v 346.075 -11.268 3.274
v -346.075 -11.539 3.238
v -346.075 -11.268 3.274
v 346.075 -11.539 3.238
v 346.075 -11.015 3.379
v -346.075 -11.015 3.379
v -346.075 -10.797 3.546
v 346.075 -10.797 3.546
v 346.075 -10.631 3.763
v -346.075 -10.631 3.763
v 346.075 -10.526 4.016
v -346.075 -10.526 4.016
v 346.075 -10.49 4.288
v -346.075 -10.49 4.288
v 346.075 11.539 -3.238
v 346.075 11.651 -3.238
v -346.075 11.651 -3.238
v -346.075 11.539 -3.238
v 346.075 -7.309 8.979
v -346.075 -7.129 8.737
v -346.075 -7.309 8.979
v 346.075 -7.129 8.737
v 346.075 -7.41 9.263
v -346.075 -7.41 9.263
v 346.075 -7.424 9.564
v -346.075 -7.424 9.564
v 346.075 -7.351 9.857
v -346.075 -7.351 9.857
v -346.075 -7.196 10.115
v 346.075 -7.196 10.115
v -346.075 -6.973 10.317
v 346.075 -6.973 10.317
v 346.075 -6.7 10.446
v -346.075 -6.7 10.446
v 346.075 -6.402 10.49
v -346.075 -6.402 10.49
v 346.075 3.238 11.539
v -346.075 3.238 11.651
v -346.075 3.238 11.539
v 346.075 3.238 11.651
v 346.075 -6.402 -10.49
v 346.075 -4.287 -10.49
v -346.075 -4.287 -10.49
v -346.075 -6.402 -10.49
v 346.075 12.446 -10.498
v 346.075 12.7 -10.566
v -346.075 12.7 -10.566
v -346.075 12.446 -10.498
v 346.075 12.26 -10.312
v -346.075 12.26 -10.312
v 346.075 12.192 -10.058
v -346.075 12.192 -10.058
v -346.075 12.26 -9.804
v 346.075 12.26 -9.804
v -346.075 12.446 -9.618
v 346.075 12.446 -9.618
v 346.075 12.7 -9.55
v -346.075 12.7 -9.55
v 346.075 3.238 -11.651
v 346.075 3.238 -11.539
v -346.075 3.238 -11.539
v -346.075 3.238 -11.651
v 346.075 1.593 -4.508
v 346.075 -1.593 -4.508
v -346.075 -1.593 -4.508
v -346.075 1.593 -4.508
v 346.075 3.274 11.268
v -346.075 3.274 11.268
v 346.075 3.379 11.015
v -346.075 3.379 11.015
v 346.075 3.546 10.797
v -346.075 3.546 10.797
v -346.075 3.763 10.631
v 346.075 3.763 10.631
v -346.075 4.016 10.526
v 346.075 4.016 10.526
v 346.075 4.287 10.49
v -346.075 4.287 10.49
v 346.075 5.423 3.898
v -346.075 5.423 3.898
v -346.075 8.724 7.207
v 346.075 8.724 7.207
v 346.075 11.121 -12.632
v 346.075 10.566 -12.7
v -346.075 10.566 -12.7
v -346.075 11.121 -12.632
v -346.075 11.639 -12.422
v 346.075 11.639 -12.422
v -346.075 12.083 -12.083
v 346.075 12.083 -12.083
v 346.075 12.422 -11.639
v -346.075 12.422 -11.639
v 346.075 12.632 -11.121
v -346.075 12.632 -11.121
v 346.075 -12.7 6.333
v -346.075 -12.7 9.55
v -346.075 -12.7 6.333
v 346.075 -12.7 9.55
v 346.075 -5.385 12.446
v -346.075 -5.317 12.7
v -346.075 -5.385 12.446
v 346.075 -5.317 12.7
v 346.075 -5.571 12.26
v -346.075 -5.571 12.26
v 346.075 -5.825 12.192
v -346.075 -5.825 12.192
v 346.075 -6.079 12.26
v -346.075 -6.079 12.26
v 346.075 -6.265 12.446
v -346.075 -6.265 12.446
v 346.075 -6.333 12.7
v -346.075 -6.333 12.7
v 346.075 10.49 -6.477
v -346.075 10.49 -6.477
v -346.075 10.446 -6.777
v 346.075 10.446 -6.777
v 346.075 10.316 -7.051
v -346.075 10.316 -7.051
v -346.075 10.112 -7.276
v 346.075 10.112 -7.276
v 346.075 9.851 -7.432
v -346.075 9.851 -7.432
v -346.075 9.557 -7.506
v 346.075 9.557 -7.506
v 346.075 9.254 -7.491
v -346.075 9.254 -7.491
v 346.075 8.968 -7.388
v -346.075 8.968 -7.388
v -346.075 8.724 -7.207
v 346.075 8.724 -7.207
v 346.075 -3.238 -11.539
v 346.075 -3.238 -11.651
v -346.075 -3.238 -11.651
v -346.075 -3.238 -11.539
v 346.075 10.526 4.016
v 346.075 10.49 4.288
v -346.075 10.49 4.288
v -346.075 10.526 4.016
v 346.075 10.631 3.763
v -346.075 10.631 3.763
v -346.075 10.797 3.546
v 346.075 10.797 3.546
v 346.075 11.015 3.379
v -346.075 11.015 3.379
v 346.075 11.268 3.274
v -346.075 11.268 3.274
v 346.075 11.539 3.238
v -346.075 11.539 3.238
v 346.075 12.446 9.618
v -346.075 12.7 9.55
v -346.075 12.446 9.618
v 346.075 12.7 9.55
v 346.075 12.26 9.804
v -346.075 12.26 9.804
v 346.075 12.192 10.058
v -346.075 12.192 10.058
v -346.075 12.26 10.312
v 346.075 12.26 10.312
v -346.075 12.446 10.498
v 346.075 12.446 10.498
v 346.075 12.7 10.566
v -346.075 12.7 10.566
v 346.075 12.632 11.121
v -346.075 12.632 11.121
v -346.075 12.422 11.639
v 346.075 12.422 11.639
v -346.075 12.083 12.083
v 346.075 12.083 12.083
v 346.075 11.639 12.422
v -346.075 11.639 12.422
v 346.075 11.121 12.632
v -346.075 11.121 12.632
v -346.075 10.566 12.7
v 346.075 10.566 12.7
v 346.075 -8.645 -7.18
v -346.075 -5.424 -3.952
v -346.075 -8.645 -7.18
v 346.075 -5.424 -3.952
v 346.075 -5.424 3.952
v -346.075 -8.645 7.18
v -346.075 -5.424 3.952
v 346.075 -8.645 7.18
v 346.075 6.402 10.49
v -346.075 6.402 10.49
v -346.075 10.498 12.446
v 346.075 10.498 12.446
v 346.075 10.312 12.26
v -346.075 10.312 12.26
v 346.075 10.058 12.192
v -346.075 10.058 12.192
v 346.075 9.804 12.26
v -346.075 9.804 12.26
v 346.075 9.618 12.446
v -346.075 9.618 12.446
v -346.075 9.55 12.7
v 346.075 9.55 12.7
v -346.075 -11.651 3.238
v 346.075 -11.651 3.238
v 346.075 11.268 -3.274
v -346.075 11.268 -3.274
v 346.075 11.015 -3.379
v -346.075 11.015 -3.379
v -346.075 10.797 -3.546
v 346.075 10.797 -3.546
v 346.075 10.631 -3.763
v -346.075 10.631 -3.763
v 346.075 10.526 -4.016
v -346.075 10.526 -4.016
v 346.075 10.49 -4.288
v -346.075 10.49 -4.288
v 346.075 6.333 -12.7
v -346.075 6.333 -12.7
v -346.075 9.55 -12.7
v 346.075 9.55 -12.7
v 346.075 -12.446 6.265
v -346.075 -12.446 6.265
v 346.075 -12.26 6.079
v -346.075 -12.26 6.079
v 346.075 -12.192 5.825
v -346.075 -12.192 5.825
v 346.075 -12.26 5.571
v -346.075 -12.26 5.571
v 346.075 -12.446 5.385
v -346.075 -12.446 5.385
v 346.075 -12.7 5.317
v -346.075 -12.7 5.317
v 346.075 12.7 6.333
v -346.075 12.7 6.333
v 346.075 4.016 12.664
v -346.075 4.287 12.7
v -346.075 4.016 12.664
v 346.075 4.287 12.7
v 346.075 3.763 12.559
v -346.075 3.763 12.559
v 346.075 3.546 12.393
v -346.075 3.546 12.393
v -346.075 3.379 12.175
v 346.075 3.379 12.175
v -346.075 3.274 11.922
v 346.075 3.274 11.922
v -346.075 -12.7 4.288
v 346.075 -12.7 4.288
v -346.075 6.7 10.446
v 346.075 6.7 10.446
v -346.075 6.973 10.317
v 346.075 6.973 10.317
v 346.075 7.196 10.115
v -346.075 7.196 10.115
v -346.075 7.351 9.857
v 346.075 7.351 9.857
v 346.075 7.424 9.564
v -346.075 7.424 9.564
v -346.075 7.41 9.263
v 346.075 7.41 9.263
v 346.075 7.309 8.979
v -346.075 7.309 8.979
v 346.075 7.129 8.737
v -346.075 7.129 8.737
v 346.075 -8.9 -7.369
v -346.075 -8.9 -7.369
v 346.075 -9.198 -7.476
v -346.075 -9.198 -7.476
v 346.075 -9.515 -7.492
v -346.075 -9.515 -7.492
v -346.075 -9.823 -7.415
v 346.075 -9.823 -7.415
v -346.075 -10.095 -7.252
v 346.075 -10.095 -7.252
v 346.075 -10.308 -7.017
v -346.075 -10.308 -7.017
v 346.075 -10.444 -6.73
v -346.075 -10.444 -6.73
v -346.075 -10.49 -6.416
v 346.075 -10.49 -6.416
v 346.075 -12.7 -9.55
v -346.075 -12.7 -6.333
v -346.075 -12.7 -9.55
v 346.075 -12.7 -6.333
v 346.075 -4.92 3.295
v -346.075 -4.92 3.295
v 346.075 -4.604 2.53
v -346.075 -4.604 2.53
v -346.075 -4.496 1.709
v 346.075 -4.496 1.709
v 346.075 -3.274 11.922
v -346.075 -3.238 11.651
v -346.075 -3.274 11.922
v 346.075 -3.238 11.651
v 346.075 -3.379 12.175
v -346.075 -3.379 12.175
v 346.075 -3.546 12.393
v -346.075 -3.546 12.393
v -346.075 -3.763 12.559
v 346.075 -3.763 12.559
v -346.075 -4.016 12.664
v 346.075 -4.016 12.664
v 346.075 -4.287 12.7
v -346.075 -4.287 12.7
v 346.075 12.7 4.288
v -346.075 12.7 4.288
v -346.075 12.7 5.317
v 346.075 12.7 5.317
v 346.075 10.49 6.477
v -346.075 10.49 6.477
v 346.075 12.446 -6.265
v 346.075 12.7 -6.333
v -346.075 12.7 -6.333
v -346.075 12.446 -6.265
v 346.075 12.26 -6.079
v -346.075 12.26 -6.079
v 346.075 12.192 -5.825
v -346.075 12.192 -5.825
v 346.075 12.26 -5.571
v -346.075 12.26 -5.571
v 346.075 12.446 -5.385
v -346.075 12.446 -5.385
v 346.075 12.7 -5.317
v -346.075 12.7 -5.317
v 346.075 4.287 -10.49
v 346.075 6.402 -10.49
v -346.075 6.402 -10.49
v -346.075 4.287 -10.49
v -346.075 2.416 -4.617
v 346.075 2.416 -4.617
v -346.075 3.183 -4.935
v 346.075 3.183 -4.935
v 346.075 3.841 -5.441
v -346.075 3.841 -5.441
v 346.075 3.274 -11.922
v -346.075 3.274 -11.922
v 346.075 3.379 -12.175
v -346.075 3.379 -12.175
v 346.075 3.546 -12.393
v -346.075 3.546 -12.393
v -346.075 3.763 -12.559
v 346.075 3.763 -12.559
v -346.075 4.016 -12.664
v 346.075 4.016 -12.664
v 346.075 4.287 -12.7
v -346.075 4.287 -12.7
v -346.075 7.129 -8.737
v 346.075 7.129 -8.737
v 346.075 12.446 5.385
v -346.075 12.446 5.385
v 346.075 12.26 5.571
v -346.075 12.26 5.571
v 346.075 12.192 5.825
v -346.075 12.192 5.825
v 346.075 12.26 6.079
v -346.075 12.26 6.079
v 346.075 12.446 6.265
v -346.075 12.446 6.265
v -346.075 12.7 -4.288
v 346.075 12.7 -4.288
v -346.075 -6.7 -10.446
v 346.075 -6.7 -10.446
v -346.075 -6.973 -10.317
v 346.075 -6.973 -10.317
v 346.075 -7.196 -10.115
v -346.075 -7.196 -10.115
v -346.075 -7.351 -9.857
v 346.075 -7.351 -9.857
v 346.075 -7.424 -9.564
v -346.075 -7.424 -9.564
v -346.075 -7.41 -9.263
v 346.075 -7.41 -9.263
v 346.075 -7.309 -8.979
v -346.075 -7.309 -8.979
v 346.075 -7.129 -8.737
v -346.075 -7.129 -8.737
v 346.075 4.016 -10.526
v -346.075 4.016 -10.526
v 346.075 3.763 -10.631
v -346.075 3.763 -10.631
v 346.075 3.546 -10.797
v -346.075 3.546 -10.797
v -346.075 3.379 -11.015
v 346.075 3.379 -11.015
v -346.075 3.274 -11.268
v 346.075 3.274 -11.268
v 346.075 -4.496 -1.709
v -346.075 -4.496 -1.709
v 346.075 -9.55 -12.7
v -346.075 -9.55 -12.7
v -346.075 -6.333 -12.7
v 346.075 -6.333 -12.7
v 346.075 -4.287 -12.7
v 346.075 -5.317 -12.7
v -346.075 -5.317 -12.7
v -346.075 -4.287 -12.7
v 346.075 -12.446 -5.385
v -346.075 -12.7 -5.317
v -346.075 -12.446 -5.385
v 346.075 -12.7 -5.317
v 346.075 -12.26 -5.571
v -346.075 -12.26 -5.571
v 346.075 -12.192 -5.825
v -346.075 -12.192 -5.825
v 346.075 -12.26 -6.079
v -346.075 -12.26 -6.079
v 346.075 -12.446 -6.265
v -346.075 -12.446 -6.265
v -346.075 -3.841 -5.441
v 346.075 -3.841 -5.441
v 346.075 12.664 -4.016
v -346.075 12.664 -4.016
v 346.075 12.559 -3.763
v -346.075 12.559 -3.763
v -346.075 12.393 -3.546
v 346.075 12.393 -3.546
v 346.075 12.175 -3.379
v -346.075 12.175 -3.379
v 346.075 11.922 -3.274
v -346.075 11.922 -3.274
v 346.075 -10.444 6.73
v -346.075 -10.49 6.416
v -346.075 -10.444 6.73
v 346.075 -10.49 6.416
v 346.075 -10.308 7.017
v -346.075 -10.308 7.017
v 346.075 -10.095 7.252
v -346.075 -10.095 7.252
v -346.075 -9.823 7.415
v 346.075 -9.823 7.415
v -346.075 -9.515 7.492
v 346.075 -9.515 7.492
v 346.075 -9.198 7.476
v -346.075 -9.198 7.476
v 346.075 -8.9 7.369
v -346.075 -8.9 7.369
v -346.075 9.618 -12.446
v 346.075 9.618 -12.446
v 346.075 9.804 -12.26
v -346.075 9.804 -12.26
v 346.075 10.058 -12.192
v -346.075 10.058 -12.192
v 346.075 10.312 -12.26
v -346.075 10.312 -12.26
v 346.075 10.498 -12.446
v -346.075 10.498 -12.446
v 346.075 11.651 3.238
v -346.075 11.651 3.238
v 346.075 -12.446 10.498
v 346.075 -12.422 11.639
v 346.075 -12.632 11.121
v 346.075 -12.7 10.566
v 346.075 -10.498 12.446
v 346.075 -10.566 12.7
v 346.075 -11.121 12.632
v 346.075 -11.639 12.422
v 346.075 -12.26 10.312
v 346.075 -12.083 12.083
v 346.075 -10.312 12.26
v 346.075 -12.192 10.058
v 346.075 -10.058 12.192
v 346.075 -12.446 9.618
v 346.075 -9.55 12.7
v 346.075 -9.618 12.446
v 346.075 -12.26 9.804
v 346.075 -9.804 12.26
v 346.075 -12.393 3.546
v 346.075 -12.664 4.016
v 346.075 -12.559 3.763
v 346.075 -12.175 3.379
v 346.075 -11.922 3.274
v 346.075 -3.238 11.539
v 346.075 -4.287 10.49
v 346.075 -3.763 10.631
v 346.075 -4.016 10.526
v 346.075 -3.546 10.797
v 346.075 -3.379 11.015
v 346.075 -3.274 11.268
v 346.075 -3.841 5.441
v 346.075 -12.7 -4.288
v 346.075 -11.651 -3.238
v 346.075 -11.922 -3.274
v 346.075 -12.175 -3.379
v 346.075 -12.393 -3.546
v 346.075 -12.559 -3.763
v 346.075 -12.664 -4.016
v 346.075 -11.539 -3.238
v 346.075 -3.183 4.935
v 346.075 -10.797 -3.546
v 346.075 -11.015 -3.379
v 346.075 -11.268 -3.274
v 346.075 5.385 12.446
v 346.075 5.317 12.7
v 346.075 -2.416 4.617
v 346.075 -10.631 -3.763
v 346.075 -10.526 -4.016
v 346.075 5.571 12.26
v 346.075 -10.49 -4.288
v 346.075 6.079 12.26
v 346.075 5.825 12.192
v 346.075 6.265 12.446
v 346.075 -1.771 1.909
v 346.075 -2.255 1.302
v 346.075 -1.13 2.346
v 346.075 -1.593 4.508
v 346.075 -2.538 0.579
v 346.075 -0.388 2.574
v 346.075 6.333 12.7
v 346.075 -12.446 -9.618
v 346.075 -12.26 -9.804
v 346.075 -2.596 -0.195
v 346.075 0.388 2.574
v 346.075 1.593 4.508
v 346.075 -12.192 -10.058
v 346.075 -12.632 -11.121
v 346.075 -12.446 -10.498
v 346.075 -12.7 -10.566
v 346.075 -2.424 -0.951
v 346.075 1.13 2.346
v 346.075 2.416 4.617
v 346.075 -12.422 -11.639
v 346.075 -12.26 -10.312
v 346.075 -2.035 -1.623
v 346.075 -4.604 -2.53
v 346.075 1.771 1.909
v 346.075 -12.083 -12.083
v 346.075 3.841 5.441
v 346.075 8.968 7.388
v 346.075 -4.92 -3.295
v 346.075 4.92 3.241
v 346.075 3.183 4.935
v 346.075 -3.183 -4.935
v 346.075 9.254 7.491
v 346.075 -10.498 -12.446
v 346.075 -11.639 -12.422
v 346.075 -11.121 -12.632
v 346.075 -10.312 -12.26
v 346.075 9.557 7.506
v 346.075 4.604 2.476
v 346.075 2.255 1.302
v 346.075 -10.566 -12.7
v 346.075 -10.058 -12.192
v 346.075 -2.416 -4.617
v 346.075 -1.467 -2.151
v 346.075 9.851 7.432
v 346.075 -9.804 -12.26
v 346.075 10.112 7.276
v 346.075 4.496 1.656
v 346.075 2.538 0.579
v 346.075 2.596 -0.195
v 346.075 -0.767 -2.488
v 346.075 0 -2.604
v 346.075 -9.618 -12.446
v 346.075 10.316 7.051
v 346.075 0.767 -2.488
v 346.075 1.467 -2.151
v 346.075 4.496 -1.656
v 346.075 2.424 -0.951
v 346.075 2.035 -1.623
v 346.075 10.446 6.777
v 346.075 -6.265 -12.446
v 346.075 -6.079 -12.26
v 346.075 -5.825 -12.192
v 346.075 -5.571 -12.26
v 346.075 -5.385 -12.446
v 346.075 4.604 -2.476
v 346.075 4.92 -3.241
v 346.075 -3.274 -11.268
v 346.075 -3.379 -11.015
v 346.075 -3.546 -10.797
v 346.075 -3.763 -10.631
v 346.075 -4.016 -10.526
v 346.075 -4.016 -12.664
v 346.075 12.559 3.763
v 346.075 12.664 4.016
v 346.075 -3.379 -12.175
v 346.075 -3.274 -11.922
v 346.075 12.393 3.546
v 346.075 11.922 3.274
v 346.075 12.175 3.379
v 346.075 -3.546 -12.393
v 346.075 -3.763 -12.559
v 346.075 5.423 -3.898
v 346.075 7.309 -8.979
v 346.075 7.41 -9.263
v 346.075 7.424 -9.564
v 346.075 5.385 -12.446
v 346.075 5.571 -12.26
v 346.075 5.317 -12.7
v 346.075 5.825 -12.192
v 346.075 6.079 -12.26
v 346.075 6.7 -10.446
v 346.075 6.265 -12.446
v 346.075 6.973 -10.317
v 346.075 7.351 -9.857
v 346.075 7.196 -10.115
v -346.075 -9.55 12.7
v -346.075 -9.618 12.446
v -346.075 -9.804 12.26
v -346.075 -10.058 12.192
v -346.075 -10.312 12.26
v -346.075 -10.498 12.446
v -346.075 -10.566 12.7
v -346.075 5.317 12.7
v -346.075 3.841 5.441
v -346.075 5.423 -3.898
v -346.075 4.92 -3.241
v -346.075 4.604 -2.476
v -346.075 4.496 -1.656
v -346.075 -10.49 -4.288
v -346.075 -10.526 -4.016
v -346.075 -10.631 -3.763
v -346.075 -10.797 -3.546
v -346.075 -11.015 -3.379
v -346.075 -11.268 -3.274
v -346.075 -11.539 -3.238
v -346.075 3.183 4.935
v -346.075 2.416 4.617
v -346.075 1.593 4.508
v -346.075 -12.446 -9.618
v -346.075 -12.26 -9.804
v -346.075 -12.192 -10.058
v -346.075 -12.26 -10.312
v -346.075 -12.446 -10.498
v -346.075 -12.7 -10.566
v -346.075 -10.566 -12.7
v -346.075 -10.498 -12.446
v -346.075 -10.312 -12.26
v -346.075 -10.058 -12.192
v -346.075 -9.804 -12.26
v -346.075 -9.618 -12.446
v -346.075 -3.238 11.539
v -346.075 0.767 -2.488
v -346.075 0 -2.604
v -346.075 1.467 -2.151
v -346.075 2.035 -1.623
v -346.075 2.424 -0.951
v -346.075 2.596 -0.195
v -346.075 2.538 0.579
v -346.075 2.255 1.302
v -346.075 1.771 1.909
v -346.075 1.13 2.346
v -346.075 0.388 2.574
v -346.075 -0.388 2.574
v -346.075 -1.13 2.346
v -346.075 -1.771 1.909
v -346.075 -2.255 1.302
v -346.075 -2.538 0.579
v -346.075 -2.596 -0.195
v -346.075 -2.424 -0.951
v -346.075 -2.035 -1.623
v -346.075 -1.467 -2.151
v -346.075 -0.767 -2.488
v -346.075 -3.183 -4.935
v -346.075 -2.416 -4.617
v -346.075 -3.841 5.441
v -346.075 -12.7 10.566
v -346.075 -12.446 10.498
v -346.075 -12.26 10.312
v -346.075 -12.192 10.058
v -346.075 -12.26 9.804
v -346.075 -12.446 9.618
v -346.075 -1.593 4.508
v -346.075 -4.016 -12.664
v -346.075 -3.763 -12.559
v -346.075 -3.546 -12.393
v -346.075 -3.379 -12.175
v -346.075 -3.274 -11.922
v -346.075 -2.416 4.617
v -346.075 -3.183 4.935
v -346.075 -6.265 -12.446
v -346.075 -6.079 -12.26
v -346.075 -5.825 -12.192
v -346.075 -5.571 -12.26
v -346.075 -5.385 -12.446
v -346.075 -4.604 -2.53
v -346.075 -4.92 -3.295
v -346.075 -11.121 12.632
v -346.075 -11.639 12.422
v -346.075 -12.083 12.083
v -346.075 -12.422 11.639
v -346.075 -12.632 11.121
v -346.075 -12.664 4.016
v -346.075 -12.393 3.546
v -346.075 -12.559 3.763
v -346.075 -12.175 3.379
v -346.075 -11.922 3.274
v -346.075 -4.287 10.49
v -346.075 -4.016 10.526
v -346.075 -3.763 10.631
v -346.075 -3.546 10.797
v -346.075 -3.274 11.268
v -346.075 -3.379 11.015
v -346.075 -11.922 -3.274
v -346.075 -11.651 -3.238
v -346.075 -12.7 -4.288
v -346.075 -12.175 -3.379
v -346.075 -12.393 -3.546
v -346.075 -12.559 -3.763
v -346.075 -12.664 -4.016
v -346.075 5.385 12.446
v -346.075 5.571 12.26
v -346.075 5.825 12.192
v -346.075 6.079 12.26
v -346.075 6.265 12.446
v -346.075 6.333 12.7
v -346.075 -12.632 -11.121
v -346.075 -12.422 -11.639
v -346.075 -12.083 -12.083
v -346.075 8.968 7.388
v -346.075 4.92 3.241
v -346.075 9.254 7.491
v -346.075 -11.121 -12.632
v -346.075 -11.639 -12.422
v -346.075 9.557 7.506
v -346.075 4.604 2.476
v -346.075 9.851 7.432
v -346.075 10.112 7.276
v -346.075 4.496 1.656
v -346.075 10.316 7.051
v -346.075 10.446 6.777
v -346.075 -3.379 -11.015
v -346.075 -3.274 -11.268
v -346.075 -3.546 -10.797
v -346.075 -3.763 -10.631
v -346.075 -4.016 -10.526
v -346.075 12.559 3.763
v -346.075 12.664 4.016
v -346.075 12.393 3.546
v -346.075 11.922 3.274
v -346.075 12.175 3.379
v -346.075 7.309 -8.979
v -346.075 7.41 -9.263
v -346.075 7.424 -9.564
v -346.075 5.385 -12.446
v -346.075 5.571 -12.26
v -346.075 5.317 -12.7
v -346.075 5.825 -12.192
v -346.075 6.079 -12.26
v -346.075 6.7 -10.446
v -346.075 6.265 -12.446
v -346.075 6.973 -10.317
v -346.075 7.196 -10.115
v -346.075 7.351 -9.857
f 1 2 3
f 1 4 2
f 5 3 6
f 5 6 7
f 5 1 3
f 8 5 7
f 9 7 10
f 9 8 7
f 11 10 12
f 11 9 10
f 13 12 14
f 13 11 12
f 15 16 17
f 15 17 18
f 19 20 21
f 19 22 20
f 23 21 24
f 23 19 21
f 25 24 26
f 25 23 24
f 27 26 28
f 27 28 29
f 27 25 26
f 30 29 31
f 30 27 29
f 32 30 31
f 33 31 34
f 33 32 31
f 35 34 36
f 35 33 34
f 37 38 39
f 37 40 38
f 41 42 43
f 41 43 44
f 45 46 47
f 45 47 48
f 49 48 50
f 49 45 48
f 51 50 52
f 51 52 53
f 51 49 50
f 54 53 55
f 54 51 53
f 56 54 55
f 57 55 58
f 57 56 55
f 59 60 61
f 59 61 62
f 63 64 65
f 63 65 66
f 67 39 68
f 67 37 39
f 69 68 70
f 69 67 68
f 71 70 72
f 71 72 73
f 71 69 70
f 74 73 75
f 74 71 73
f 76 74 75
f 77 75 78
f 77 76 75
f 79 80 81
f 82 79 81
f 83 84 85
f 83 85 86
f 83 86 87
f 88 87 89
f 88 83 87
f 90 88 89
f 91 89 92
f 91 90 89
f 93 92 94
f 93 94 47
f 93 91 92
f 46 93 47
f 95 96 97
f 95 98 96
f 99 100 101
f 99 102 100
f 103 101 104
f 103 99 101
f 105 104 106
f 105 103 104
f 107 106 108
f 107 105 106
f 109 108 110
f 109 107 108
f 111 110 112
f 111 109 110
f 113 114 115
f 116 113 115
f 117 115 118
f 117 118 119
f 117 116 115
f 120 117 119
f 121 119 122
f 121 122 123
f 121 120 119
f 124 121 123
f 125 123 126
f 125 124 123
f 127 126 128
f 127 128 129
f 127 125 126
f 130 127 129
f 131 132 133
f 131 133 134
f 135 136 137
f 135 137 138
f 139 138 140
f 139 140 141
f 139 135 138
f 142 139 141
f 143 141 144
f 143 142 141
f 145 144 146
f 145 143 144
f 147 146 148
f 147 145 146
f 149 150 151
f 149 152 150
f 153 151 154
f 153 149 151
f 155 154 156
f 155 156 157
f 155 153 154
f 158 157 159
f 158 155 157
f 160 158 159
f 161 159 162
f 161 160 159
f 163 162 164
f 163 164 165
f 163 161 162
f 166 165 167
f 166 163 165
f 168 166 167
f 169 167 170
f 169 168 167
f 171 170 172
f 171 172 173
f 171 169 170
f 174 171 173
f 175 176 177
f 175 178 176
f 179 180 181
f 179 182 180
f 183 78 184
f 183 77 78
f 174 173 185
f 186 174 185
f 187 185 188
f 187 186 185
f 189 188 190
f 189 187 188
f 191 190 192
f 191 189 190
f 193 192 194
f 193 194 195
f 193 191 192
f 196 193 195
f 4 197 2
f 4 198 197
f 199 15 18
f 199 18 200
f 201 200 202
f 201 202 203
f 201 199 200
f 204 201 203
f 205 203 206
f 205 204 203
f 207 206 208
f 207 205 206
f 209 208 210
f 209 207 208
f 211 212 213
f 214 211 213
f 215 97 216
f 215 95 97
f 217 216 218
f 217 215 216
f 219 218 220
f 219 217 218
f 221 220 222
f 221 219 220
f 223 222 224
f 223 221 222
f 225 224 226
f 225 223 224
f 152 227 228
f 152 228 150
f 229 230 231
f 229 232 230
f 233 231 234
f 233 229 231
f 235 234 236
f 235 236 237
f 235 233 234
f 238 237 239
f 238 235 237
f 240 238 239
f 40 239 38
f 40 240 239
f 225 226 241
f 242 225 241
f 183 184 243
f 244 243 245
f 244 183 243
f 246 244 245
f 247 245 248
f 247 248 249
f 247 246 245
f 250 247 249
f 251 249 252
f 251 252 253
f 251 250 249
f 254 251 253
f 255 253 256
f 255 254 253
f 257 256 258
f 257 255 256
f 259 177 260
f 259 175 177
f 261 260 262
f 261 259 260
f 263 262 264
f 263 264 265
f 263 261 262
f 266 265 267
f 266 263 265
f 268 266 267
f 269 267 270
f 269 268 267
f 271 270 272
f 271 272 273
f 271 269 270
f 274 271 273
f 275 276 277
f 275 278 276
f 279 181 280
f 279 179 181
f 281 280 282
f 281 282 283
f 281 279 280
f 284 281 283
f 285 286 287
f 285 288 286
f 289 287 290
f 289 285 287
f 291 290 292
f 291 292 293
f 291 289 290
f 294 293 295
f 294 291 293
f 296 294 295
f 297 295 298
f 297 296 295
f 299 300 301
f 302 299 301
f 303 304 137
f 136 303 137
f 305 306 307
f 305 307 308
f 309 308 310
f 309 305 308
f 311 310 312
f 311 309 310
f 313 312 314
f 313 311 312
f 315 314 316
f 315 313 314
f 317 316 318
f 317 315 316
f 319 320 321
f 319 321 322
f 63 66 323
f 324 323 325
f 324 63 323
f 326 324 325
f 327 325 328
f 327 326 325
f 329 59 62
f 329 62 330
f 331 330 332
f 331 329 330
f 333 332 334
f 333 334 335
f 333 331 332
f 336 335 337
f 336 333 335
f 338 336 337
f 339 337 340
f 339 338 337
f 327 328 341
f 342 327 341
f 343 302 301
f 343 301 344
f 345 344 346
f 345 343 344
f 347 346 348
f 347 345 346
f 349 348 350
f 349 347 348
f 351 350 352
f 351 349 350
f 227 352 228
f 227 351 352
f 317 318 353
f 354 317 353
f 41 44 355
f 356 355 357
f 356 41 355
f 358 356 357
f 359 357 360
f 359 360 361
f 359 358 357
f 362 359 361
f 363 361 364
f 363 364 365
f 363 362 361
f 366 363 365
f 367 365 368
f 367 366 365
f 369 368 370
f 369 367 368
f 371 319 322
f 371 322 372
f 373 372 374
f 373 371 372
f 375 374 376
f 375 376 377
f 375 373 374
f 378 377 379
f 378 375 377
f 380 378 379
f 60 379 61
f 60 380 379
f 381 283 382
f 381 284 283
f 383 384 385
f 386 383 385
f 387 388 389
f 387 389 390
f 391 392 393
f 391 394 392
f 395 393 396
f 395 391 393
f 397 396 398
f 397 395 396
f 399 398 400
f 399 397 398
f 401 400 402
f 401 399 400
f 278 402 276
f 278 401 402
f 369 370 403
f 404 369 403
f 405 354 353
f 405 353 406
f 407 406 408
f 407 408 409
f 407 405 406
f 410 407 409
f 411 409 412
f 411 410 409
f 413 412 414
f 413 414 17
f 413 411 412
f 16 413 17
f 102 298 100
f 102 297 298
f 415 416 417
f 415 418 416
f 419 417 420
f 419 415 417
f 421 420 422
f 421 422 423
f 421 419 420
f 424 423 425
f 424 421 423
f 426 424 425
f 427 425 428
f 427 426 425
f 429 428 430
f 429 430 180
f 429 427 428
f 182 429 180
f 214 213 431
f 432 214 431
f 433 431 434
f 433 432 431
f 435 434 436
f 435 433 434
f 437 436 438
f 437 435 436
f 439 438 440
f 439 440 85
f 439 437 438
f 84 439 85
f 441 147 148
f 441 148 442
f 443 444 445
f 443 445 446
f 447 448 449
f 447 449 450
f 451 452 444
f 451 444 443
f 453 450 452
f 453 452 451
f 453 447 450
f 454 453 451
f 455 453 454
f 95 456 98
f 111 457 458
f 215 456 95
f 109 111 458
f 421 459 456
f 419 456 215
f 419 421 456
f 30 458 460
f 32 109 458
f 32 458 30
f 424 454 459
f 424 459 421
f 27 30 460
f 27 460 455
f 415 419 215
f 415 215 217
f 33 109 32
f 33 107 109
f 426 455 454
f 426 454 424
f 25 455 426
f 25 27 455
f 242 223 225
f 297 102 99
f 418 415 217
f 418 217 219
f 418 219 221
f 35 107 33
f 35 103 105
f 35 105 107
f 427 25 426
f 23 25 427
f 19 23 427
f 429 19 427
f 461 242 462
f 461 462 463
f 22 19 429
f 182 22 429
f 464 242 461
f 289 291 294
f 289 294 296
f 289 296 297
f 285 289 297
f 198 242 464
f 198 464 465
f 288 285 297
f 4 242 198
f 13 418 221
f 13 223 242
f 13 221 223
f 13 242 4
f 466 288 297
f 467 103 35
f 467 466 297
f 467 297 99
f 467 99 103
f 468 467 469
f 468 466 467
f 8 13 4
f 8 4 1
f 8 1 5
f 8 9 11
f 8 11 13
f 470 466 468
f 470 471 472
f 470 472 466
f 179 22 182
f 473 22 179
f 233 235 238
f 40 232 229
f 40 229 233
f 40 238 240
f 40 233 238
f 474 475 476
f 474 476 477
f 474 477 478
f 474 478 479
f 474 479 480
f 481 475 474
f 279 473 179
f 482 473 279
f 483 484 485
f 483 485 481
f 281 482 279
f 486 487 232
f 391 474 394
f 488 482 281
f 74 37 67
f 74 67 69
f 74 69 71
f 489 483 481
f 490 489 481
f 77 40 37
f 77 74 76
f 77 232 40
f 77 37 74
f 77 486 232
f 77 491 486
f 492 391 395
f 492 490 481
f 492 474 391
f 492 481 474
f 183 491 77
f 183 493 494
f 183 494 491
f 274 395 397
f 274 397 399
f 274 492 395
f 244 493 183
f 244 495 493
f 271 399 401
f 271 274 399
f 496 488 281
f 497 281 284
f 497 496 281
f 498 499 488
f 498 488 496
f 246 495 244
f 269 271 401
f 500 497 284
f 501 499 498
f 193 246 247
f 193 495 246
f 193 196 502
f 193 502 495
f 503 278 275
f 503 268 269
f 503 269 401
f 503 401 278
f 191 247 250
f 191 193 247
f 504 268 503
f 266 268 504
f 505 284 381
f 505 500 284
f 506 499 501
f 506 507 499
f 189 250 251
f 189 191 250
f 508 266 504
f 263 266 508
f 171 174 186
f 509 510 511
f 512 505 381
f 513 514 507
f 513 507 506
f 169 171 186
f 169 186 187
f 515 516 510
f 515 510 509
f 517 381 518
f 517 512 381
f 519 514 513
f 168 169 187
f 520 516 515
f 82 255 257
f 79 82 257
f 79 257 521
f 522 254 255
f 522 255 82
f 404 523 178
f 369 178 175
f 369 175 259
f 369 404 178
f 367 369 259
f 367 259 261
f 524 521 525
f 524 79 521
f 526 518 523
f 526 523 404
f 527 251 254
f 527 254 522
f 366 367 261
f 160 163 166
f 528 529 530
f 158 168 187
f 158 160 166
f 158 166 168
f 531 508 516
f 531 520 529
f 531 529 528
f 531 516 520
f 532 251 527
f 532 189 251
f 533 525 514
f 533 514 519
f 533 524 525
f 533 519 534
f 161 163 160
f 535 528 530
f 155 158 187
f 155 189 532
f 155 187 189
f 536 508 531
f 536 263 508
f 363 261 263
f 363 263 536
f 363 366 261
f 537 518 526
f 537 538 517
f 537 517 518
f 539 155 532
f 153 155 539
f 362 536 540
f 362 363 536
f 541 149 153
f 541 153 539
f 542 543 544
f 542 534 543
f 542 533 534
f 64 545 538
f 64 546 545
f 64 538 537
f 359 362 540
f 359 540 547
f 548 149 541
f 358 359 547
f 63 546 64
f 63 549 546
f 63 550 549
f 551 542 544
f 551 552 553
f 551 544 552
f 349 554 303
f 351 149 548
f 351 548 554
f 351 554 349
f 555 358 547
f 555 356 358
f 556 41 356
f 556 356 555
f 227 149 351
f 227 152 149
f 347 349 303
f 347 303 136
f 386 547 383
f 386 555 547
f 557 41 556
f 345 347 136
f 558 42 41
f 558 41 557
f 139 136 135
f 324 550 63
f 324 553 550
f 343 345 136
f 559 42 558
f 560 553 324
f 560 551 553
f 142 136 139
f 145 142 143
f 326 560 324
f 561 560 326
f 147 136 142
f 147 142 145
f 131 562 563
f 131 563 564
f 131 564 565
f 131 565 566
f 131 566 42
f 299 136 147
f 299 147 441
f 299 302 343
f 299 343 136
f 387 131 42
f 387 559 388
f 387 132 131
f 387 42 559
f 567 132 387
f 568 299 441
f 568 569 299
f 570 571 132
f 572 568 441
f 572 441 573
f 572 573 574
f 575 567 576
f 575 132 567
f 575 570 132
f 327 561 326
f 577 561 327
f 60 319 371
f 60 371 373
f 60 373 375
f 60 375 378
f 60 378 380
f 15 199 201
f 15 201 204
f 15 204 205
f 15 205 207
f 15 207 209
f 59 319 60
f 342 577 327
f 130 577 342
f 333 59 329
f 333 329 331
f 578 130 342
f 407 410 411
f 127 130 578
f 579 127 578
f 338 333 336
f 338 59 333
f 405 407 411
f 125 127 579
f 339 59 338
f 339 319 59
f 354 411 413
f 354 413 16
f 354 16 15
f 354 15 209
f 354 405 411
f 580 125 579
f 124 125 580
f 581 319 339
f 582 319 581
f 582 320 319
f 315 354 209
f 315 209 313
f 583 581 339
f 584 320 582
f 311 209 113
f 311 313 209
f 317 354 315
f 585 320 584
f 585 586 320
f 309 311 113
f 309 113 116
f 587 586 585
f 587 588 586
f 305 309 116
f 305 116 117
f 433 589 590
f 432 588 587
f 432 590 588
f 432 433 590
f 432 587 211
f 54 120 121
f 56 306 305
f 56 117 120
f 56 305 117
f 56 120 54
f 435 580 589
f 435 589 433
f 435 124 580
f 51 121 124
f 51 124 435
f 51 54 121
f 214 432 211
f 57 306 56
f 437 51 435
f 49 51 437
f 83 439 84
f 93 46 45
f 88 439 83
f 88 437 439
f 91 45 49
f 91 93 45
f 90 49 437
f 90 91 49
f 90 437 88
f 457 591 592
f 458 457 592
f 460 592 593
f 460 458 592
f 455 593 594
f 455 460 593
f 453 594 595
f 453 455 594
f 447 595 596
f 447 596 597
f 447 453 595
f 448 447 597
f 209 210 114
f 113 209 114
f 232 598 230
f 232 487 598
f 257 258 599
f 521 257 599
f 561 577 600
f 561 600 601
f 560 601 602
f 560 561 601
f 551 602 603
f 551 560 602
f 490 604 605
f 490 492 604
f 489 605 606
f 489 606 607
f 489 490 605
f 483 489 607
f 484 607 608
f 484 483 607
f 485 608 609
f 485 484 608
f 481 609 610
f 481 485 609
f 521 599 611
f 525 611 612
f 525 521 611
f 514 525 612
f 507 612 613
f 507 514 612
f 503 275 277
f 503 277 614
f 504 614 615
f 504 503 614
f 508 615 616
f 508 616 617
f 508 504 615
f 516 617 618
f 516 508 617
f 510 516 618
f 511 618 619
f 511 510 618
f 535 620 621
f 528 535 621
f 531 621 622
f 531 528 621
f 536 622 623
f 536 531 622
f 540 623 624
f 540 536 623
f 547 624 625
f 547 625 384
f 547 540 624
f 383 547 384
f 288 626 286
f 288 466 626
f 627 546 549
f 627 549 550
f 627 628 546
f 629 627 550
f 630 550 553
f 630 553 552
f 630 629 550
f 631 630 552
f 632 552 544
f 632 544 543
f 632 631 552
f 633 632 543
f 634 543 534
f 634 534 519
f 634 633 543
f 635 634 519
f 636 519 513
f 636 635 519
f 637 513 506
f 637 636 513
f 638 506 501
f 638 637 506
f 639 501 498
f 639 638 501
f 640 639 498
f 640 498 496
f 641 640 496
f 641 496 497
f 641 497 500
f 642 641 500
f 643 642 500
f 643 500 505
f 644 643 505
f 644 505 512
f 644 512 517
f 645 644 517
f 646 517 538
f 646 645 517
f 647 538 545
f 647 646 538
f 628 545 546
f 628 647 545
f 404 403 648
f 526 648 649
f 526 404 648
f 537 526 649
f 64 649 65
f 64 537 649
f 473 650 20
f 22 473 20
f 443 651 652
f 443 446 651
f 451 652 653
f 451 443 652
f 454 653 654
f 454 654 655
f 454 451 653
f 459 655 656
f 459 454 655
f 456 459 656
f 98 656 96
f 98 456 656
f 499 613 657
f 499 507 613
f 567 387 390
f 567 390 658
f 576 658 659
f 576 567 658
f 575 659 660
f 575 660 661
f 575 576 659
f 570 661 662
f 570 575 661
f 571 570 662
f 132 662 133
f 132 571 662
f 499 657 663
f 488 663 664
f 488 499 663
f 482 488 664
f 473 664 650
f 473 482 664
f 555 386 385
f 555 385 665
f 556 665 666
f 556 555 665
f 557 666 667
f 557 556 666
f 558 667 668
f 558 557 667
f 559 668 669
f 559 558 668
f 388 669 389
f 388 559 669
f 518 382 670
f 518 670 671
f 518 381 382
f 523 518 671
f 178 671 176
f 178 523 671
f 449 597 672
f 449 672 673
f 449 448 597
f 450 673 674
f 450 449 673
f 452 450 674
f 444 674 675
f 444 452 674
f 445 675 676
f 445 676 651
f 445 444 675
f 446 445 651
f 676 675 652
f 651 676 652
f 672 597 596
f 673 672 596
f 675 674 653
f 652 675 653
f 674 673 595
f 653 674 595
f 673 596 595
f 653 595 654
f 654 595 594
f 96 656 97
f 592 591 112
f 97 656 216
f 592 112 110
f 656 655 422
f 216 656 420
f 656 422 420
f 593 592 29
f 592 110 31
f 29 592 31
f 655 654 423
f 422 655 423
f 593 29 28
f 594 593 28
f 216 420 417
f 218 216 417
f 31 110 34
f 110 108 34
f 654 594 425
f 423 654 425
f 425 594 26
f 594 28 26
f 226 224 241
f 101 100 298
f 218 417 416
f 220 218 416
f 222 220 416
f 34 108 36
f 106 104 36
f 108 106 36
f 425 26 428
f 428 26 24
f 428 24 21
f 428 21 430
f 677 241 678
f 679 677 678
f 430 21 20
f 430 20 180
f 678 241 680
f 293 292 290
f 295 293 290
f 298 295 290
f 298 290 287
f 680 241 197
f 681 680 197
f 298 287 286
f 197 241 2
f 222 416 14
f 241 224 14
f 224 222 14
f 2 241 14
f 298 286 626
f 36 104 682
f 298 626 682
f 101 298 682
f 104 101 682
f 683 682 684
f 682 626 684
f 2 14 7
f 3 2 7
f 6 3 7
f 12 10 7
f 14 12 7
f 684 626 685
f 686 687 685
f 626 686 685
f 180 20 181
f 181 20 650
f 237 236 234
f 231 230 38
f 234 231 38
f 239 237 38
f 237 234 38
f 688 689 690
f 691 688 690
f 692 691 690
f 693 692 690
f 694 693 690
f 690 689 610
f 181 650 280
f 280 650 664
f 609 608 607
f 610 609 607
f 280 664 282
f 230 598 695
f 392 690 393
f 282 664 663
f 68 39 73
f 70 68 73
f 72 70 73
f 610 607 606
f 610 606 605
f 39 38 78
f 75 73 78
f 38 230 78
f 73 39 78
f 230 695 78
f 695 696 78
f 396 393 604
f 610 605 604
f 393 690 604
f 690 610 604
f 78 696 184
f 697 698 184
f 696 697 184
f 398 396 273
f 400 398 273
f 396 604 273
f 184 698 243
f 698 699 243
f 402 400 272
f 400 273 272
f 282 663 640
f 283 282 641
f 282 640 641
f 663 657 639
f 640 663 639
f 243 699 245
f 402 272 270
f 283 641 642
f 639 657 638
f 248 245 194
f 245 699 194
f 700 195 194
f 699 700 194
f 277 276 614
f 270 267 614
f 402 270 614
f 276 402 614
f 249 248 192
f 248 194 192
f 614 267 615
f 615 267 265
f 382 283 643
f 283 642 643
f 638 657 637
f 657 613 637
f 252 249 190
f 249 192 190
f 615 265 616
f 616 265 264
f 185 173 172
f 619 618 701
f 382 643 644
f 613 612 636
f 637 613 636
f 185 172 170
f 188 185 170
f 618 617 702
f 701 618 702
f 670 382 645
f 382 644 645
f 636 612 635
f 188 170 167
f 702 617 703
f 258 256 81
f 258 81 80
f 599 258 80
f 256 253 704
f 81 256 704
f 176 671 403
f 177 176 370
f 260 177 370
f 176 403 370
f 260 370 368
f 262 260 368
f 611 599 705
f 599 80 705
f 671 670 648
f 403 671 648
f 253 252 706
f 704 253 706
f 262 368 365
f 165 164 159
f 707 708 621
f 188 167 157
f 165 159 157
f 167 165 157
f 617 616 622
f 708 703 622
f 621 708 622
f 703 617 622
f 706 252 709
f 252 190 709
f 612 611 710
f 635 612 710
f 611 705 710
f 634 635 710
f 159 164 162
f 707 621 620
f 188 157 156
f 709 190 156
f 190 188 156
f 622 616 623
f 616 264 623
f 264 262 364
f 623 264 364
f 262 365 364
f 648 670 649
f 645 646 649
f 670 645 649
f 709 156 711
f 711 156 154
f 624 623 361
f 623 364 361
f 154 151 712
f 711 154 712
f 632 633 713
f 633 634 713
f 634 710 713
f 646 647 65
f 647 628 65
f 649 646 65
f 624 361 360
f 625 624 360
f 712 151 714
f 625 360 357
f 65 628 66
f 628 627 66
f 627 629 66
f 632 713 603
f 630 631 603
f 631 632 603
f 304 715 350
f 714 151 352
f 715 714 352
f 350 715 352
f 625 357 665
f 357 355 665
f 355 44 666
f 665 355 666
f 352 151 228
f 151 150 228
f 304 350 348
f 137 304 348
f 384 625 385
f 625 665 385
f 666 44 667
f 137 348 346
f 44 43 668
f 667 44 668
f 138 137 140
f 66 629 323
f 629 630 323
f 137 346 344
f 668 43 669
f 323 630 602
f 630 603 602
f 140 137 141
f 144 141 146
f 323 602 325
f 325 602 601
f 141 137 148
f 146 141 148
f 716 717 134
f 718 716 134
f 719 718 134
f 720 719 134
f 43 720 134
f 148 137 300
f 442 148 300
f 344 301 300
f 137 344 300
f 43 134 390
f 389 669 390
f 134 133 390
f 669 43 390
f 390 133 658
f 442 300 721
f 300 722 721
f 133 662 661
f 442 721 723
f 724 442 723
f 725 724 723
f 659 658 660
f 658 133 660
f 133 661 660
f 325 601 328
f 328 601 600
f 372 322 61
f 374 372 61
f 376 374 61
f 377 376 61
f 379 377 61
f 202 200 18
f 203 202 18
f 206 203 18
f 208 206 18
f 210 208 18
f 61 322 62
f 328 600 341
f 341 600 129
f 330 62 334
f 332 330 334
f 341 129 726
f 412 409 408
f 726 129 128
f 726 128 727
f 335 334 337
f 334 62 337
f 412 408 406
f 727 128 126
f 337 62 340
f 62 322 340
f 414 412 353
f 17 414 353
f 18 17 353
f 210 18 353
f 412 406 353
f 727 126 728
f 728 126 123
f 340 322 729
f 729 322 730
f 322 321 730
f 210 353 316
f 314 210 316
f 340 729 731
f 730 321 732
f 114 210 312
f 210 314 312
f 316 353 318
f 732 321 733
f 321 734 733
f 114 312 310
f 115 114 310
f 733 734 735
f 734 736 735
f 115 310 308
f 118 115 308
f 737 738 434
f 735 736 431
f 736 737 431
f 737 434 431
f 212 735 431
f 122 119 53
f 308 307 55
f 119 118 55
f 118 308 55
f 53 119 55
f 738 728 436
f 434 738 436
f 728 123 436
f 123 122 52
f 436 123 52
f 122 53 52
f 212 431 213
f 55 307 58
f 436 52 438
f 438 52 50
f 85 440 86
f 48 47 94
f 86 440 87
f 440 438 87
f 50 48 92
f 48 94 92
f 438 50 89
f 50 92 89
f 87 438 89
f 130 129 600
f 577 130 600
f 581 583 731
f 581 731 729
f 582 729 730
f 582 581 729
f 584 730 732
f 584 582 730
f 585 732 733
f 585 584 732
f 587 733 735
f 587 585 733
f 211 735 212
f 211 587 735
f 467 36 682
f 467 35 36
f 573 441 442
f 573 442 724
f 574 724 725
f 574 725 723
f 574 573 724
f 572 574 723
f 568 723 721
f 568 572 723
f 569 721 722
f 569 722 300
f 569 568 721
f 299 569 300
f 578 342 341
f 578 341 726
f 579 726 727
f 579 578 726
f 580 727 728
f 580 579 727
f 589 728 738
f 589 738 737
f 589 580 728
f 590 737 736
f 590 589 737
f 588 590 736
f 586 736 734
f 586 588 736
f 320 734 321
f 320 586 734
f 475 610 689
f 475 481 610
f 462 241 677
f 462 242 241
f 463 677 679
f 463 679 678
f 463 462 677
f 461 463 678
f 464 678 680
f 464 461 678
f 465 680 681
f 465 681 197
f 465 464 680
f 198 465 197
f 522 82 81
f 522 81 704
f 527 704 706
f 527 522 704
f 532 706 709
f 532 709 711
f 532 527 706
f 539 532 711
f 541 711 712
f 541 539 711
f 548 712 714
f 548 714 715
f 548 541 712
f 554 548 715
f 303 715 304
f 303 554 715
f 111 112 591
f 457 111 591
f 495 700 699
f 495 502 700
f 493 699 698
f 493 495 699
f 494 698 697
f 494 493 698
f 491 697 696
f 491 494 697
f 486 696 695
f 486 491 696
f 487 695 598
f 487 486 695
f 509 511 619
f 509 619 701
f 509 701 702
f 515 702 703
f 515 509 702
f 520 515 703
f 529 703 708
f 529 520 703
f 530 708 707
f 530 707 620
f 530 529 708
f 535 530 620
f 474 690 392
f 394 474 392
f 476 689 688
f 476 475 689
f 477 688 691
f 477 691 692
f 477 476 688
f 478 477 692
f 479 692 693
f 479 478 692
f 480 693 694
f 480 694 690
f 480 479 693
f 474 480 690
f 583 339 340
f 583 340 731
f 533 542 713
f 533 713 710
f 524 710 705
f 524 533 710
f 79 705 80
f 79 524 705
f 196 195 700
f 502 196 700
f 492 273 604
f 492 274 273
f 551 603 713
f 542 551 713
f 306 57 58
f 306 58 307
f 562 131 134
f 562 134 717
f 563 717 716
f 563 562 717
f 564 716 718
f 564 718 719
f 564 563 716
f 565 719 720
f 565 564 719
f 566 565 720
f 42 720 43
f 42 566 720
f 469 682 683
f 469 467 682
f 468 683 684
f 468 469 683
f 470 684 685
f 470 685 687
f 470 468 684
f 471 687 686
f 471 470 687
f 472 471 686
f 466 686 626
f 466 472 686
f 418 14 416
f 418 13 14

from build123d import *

# Parameters (mm, degrees)
SKETCH1_R           = 2.6035
BOSS_EXTRUDE1_DEPTH = 346.075


with BuildPart() as part:
    # Sketch1 → Boss-Extrude1 (new body, symmetric)
    with BuildSketch(Plane(origin=(0, 0, 0), x_dir=(0, 0, -1), z_dir=(1, 0, 0))):
        with BuildLine():
            Line((6.333126718, -12.7), (9.550443118, -12.7))
            ThreePointArc((9.550443118, -12.7), (10.058366869, -12.192000006), (10.566443095, -12.699847501))
            ThreePointArc((10.566443095, -12.699847501), (12.082537762, -12.08250727), (12.699846982, -10.566399977))
            ThreePointArc((12.699846982, -10.566399977), (12.192000006, -10.058323491), (12.7, -9.5504))
            Line((12.7, -9.5504), (12.7, -6.3330836))
            ThreePointArc((12.7, -6.3330836), (12.192, -5.8250836), (12.7, -5.3170836))
            Line((12.7, -5.3170836), (12.7, -4.287469289))
            ThreePointArc((12.7, -4.287469289), (12.39275138, -3.545705502), (11.650987593, -3.238456882))
            Line((11.650987593, -3.238456882), (11.539212407, -3.238456882))
            ThreePointArc((11.539212407, -3.238456882), (10.79744862, -3.545705502), (10.4902, -4.287469289))
            Line((10.4902, -4.287469289), (10.4902, -6.402089023))
            ThreePointArc((10.4902, -6.402089023), (9.856505071, -7.351067942), (8.737131347, -7.129408934))
            Line((8.737131347, -7.129408934), (5.441005833, -3.840816462))
            ThreePointArc((5.441005833, -3.840816462), (4.750877967, -2.809883091), (4.5085, -1.593185507))
            Line((4.5085, -1.593185507), (4.5085, 1.593185507))
            ThreePointArc((4.5085, 1.593185507), (4.750877967, 2.809883091), (5.441005833, 3.840816462))
            Line((5.441005833, 3.840816462), (8.737131347, 7.129408934))
            ThreePointArc((8.737131347, 7.129408934), (9.856505071, 7.351067942), (10.4902, 6.402089023))
            Line((10.4902, 6.402089023), (10.4902, 4.287469289))
            ThreePointArc((10.4902, 4.287469289), (10.79744862, 3.545705502), (11.539212407, 3.238456882))
            Line((11.539212407, 3.238456882), (11.650987593, 3.238456882))
            ThreePointArc((11.650987593, 3.238456882), (12.39275138, 3.545705502), (12.7, 4.287469289))
            Line((12.7, 4.287469289), (12.7, 5.3170836))
            ThreePointArc((12.7, 5.3170836), (12.192, 5.8250836), (12.7, 6.3330836))
            Line((12.7, 6.3330836), (12.7, 9.5504))
            ThreePointArc((12.7, 9.5504), (12.192000006, 10.058323491), (12.699846982, 10.566399977))
            ThreePointArc((12.699846982, 10.566399977), (12.082537762, 12.08250727), (10.566443095, 12.699847501))
            ThreePointArc((10.566443095, 12.699847501), (10.058366869, 12.192000006), (9.550443118, 12.7))
            Line((9.550443118, 12.7), (6.333126718, 12.7))
            ThreePointArc((6.333126718, 12.7), (5.825126718, 12.192), (5.317126718, 12.7))
            Line((5.317126718, 12.7), (4.287512407, 12.7))
            ThreePointArc((4.287512407, 12.7), (3.54574862, 12.39275138), (3.2385, 11.650987593))
            Line((3.2385, 11.650987593), (3.2385, 11.539212407))
            ThreePointArc((3.2385, 11.539212407), (3.54574862, 10.79744862), (4.287512407, 10.4902))
            Line((4.287512407, 10.4902), (6.476788598, 10.4902))
            ThreePointArc((6.476788598, 10.4902), (7.432222385, 9.85140422), (7.207036008, 8.724370562))
            Line((7.207036008, 8.724370562), (3.898272566, 5.423169045))
            ThreePointArc((3.898272566, 5.423169045), (2.869120213, 4.736787962), (1.655778399, 4.4958))
            Line((1.655778399, 4.4958), (-1.655778399, 4.4958))
            ThreePointArc((-1.655778399, 4.4958), (-2.869120213, 4.736787962), (-3.898272566, 5.423169045))
            Line((-3.898272566, 5.423169045), (-7.207036008, 8.724370562))
            ThreePointArc((-7.207036008, 8.724370562), (-7.432222385, 9.85140422), (-6.476788598, 10.4902))
            Line((-6.476788598, 10.4902), (-4.287512407, 10.4902))
            ThreePointArc((-4.287512407, 10.4902), (-3.54574862, 10.79744862), (-3.2385, 11.539212407))
            Line((-3.2385, 11.539212407), (-3.2385, 11.650987593))
            ThreePointArc((-3.2385, 11.650987593), (-3.54574862, 12.39275138), (-4.287512407, 12.7))
            Line((-4.287512407, 12.7), (-5.317126718, 12.7))
            ThreePointArc((-5.317126718, 12.7), (-5.825126718, 12.192), (-6.333126718, 12.7))
            Line((-6.333126718, 12.7), (-9.550443118, 12.7))
            ThreePointArc((-9.550443118, 12.7), (-10.058366869, 12.192000006), (-10.566443095, 12.699847501))
            ThreePointArc((-10.566443095, 12.699847501), (-12.082537762, 12.08250727), (-12.699846982, 10.566399977))
            ThreePointArc((-12.699846982, 10.566399977), (-12.192000006, 10.058323491), (-12.7, 9.5504))
            Line((-12.7, 9.5504), (-12.7, 6.3330836))
            ThreePointArc((-12.7, 6.3330836), (-12.192, 5.8250836), (-12.7, 5.3170836))
            Line((-12.7, 5.3170836), (-12.7, 4.287469289))
            ThreePointArc((-12.7, 4.287469289), (-12.39275138, 3.545705502), (-11.650987593, 3.238456882))
            Line((-11.650987593, 3.238456882), (-11.539212407, 3.238456882))
            ThreePointArc((-11.539212407, 3.238456882), (-10.79744862, 3.545705502), (-10.4902, 4.287469289))
            Line((-10.4902, 4.287469289), (-10.4902, 6.402089023))
            ThreePointArc((-10.4902, 6.402089023), (-9.856505071, 7.351067942), (-8.737131347, 7.129408934))
            Line((-8.737131347, 7.129408934), (-5.441005833, 3.840816462))
            ThreePointArc((-5.441005833, 3.840816462), (-4.750877967, 2.809883091), (-4.5085, 1.593185507))
            Line((-4.5085, 1.593185507), (-4.5085, -1.593185507))
            ThreePointArc((-4.5085, -1.593185507), (-4.750877967, -2.809883091), (-5.441005833, -3.840816462))
            Line((-5.441005833, -3.840816462), (-8.737131347, -7.129408934))
            ThreePointArc((-8.737131347, -7.129408934), (-9.856505071, -7.351067942), (-10.4902, -6.402089023))
            Line((-10.4902, -6.402089023), (-10.4902, -4.287469289))
            ThreePointArc((-10.4902, -4.287469289), (-10.79744862, -3.545705502), (-11.539212407, -3.238456882))
            Line((-11.539212407, -3.238456882), (-11.650987593, -3.238456882))
            ThreePointArc((-11.650987593, -3.238456882), (-12.39275138, -3.545705502), (-12.7, -4.287469289))
            Line((-12.7, -4.287469289), (-12.7, -5.3170836))
            ThreePointArc((-12.7, -5.3170836), (-12.192, -5.8250836), (-12.7, -6.3330836))
            Line((-12.7, -6.3330836), (-12.7, -9.5504))
            ThreePointArc((-12.7, -9.5504), (-12.192000006, -10.058323491), (-12.699846982, -10.566399977))
            ThreePointArc((-12.699846982, -10.566399977), (-12.082537762, -12.08250727), (-10.566443095, -12.699847501))
            ThreePointArc((-10.566443095, -12.699847501), (-10.058366869, -12.192000006), (-9.550443118, -12.7))
            Line((-9.550443118, -12.7), (-6.333126718, -12.7))
            ThreePointArc((-6.333126718, -12.7), (-5.825126718, -12.192), (-5.317126718, -12.7))
            Line((-5.317126718, -12.7), (-4.287512407, -12.7))
            ThreePointArc((-4.287512407, -12.7), (-3.54574862, -12.39275138), (-3.2385, -11.650987593))
            Line((-3.2385, -11.650987593), (-3.2385, -11.539212407))
            ThreePointArc((-3.2385, -11.539212407), (-3.54574862, -10.79744862), (-4.287512407, -10.4902))
            Line((-4.287512407, -10.4902), (-6.416408329, -10.4902))
            ThreePointArc((-6.416408329, -10.4902), (-7.41473083, -9.822813117), (-7.179650497, -8.645192506))
            Line((-7.179650497, -8.645192506), (-3.952270251, -5.423690499))
            ThreePointArc((-3.952270251, -5.423690499), (-2.922936451, -4.736929036), (-1.709253557, -4.4958))
            Line((-1.709253557, -4.4958), (1.709253557, -4.4958))
            ThreePointArc((1.709253557, -4.4958), (2.922936451, -4.736929036), (3.952270251, -5.423690499))
            Line((3.952270251, -5.423690499), (7.179650497, -8.645192506))
            ThreePointArc((7.179650497, -8.645192506), (7.41473083, -9.822813117), (6.416408329, -10.4902))
            Line((6.416408329, -10.4902), (4.287512407, -10.4902))
            ThreePointArc((4.287512407, -10.4902), (3.54574862, -10.79744862), (3.2385, -11.539212407))
            Line((3.2385, -11.539212407), (3.2385, -11.650987593))
            ThreePointArc((3.2385, -11.650987593), (3.54574862, -12.39275138), (4.287512407, -12.7))
            Line((4.287512407, -12.7), (5.317126718, -12.7))
            ThreePointArc((5.317126718, -12.7), (5.825126718, -12.192), (6.333126718, -12.7))
        make_face()
        Circle(SKETCH1_R, mode=Mode.SUBTRACT)
    extrude(amount=BOSS_EXTRUDE1_DEPTH, both=True)


solid = part.part
